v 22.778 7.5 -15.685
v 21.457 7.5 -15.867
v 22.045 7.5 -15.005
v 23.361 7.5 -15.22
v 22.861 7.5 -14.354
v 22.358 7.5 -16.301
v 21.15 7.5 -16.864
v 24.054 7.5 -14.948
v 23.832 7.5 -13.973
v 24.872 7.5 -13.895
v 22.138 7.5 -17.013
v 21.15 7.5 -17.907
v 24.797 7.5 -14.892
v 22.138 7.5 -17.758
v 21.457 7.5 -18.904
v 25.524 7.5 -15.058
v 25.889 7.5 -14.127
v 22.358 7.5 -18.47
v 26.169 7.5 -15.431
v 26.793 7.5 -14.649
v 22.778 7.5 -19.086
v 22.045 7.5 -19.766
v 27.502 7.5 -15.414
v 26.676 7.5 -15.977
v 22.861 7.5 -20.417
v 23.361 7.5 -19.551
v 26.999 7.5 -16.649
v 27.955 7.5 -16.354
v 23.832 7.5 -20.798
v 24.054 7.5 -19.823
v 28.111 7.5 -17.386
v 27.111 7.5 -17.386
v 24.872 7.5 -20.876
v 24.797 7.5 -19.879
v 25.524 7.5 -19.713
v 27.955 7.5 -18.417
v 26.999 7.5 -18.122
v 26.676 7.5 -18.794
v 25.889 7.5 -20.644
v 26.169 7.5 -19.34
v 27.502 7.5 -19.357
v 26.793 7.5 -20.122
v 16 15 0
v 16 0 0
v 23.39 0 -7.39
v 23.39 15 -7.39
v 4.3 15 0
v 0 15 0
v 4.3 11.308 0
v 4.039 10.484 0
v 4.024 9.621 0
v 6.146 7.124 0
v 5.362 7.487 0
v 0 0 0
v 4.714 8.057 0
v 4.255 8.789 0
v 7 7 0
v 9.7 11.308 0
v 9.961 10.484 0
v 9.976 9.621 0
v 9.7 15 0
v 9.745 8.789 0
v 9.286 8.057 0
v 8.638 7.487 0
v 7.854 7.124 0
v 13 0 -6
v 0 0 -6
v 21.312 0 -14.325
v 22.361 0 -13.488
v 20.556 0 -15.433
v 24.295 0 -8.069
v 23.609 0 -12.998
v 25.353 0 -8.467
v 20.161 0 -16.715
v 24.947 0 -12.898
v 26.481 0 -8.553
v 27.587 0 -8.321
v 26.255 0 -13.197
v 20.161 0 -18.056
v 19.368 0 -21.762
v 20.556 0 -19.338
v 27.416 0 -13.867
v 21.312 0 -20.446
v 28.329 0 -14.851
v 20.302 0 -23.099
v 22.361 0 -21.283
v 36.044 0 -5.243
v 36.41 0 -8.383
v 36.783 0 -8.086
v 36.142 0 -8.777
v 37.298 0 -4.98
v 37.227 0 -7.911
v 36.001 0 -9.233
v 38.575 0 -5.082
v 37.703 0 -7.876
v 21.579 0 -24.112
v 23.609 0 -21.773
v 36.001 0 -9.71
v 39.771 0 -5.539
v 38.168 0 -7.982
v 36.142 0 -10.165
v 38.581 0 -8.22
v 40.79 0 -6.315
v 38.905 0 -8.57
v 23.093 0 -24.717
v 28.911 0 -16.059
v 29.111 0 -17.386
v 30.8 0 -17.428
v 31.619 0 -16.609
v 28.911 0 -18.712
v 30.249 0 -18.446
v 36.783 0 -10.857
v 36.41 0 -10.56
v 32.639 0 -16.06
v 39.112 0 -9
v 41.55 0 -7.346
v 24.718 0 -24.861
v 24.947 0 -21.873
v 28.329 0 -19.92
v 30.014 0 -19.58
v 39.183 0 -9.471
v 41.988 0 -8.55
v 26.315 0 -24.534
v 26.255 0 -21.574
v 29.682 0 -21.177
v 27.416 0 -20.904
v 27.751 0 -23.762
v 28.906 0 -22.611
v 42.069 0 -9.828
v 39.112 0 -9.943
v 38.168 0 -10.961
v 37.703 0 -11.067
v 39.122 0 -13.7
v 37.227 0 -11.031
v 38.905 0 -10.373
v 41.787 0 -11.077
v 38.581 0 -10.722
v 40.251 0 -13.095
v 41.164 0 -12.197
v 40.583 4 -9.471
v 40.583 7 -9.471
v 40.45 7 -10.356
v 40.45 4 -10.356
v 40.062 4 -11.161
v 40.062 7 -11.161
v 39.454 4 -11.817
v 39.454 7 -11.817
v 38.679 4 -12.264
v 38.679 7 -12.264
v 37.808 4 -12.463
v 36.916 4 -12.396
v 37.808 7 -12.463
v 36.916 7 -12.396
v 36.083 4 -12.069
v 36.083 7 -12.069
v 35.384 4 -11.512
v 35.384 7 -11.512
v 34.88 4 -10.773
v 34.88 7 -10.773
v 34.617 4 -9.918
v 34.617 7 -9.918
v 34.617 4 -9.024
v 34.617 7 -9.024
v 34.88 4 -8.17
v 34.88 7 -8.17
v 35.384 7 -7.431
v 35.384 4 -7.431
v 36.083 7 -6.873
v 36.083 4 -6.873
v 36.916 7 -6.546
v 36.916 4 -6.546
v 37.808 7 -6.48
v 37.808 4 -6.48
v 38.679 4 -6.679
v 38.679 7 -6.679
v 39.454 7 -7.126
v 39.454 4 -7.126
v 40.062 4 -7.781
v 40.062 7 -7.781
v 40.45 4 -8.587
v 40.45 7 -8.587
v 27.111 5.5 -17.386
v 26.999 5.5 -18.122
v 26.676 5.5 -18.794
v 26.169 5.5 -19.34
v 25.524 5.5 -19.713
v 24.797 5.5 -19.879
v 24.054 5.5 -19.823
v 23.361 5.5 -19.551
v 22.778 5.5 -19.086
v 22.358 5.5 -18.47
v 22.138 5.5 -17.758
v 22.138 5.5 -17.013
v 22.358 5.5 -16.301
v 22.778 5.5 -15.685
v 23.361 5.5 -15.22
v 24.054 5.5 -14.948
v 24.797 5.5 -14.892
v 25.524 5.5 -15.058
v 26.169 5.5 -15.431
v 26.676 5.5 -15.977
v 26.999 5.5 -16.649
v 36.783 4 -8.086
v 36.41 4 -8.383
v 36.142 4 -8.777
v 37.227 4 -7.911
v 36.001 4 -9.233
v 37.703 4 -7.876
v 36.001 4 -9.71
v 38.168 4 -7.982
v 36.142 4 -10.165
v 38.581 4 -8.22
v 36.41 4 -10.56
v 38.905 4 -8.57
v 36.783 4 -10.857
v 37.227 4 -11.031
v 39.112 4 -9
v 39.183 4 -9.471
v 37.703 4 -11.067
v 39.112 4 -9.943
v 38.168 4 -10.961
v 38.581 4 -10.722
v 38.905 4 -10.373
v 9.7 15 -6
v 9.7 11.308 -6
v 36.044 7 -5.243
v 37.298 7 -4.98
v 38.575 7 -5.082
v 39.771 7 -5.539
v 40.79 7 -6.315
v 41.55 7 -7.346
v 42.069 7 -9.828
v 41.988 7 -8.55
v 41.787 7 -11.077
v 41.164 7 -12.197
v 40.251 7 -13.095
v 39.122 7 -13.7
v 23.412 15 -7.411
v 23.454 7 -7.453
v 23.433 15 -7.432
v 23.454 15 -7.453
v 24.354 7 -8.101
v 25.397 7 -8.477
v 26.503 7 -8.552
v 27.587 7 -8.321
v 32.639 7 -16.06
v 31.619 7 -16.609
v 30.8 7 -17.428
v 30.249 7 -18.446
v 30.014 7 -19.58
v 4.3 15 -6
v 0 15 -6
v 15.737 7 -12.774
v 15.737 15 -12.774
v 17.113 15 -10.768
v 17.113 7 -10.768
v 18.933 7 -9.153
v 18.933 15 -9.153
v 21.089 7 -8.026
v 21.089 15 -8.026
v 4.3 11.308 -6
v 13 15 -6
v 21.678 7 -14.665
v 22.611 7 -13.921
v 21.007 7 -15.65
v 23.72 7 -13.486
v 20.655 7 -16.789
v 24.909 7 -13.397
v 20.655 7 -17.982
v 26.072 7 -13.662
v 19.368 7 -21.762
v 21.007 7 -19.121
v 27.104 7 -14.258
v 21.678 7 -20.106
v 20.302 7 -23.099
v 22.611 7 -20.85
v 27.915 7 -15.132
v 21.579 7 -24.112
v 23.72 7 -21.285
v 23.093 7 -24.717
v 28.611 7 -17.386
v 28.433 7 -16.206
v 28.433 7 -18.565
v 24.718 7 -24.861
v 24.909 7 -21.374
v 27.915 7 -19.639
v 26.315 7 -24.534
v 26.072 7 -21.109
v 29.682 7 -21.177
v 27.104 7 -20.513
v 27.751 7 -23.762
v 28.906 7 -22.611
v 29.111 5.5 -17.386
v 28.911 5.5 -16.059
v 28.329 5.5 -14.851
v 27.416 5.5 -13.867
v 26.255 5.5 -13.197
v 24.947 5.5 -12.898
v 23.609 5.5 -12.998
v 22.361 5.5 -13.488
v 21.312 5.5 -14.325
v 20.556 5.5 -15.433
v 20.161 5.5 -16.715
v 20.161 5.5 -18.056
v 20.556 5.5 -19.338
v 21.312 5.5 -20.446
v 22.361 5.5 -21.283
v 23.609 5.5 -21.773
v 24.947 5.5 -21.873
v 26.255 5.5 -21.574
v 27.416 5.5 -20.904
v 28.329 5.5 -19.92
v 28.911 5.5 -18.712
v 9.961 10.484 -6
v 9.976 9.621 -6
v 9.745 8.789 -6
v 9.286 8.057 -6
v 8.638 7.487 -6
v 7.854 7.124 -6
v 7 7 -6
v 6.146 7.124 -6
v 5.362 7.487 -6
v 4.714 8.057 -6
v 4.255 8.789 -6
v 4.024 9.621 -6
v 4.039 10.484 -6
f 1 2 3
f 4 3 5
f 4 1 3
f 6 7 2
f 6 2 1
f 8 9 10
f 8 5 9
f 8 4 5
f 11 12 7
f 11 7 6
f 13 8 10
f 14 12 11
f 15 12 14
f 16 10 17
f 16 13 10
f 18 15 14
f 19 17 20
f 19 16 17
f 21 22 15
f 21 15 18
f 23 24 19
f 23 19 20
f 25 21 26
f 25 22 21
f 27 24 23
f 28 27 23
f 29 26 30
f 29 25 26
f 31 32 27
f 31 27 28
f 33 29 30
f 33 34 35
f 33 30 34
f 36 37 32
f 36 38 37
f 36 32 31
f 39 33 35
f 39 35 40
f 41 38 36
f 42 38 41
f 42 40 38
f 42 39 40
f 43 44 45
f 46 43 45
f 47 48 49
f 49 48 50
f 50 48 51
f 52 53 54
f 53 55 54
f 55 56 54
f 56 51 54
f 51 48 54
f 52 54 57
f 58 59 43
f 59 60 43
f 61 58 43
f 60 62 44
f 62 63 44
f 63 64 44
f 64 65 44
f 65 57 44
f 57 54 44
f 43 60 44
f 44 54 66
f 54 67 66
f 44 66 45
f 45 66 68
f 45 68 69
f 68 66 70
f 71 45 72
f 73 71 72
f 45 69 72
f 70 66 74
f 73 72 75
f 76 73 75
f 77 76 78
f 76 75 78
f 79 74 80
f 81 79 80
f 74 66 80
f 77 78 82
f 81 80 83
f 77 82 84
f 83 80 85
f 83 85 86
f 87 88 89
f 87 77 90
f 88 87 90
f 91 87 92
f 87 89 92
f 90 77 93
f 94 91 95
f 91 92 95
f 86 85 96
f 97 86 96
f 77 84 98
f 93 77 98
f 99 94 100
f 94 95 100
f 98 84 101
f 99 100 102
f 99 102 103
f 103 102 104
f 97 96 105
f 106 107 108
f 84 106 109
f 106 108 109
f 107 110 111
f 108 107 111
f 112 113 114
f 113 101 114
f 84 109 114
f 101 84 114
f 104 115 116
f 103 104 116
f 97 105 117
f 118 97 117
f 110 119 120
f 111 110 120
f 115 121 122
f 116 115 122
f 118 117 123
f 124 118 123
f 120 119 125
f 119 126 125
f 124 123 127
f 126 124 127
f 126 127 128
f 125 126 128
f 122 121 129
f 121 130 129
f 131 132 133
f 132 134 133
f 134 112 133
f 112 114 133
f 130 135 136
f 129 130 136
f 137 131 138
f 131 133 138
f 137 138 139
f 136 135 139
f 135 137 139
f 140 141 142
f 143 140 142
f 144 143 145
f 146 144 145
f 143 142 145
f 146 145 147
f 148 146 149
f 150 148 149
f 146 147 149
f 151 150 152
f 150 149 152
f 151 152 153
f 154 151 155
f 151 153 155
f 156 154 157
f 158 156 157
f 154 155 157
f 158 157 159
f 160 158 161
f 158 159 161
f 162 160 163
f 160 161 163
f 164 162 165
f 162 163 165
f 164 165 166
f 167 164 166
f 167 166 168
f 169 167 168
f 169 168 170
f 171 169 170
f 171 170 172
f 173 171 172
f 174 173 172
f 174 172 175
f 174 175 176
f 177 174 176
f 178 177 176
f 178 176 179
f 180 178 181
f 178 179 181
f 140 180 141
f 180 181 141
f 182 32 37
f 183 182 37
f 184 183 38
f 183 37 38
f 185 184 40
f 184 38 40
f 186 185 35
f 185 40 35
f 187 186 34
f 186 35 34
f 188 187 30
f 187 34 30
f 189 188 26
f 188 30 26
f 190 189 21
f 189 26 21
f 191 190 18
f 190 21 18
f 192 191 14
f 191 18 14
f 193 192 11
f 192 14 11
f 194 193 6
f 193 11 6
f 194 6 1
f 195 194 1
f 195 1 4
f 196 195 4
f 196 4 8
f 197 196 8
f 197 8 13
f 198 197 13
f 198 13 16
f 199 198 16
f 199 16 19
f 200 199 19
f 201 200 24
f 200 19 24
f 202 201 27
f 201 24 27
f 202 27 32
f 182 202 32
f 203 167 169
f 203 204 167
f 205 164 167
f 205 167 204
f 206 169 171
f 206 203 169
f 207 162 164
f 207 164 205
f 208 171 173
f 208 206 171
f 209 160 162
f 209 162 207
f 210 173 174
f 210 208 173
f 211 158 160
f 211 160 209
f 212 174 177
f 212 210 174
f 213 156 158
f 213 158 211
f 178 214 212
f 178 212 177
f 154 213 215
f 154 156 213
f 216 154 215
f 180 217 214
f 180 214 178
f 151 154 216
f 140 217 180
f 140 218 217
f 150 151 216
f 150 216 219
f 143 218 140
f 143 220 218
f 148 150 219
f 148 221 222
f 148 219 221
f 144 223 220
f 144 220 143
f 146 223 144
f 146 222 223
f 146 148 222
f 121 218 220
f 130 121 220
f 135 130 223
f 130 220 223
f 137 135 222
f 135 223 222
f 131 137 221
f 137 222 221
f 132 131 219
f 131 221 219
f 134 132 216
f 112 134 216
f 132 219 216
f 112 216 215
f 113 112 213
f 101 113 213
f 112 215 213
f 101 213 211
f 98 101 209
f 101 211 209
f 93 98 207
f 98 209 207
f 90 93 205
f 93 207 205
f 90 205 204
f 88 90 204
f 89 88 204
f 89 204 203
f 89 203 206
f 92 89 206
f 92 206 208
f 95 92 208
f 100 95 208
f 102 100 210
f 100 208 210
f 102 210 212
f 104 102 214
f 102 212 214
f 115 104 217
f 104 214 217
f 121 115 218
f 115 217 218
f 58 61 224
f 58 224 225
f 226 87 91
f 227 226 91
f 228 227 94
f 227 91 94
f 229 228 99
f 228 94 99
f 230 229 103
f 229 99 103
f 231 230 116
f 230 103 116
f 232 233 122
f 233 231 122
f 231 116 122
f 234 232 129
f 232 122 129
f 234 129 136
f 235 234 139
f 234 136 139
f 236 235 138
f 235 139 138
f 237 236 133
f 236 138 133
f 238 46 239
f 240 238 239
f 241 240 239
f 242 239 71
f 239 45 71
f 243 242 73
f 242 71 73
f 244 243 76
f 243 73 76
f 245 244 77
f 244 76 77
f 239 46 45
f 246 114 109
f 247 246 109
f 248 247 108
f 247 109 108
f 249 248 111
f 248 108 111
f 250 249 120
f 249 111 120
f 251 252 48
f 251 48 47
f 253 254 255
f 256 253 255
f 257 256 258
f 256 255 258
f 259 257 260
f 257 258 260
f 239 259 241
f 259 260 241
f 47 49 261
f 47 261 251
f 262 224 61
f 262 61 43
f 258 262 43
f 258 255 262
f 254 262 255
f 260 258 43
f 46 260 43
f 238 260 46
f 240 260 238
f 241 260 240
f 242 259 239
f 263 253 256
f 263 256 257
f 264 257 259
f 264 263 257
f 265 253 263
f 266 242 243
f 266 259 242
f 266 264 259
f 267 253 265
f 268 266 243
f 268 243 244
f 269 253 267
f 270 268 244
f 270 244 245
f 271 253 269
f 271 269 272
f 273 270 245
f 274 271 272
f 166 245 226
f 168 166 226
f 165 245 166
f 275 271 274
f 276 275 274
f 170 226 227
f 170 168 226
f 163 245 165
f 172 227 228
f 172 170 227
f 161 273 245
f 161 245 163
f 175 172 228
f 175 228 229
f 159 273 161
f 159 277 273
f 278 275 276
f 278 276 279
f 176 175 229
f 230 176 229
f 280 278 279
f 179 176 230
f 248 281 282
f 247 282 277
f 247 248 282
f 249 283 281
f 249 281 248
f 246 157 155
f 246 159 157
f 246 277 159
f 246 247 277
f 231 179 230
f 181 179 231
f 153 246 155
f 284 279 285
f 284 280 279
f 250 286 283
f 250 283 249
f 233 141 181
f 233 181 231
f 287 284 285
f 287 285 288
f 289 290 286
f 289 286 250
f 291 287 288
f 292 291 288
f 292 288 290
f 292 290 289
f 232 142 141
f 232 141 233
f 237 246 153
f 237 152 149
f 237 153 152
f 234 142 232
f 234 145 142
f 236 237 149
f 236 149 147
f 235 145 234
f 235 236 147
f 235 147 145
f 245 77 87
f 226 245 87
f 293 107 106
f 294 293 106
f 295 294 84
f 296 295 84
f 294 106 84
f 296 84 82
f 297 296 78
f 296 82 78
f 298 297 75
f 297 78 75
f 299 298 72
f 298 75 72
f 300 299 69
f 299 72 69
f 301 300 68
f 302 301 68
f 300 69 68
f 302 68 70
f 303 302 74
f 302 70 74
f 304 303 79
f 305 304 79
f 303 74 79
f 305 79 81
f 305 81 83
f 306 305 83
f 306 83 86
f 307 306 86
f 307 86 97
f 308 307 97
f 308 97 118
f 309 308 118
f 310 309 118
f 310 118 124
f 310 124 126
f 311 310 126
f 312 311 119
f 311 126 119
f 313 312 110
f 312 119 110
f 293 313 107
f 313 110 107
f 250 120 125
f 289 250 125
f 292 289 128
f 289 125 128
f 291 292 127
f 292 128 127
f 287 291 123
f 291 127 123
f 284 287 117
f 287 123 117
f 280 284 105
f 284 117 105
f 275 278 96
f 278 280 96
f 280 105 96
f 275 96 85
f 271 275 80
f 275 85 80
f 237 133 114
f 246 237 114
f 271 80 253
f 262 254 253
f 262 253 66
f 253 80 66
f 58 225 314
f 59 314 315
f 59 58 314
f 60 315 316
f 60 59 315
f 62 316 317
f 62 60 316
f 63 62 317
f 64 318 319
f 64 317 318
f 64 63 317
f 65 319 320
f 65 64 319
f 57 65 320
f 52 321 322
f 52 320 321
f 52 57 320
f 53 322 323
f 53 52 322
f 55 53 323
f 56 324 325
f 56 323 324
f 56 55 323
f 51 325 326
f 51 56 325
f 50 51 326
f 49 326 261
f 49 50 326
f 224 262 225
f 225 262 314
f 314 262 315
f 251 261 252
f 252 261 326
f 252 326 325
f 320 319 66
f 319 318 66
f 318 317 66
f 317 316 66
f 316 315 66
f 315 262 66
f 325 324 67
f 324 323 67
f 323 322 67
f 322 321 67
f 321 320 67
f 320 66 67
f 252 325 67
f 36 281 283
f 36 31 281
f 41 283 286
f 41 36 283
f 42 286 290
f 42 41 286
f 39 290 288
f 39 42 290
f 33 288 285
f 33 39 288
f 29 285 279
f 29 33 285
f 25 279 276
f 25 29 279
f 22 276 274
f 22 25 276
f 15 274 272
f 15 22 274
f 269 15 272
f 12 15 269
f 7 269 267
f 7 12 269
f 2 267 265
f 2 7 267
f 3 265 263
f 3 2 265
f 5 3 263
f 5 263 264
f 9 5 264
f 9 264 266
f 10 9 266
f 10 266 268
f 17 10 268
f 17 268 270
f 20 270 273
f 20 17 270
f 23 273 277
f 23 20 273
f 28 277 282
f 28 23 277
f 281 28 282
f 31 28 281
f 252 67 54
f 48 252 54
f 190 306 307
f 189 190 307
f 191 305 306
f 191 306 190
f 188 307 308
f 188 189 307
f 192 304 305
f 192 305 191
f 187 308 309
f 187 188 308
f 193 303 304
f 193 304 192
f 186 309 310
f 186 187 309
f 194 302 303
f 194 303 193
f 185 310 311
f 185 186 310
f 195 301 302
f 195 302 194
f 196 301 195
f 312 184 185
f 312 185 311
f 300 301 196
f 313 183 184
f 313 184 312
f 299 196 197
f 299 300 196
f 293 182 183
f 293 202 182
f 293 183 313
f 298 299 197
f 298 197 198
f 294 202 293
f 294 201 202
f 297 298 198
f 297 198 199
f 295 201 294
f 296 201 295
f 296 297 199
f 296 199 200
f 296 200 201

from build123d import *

# Parameters (mm, degrees)
BOSS_EXTRUDE2_DEPTH = 15
CUT_EXTRUDE2_DEPTH  = 8
SKETCH5_R           = 4
BOSS_EXTRUDE3_DEPTH = 0.5
BOSS_EXTRUDE3_TAPER = 45
SKETCH6_R           = 2.5
CUT_EXTRUDE3_DEPTH  = 2
SKETCH7_R           = 4.5
CUT_EXTRUDE4_DEPTH  = 5.5
CUT_EXTRUDE5_DEPTH  = 15
SKETCH9_R           = 3
CUT_EXTRUDE6_DEPTH  = 3
SKETCH10_R          = 1.6
CUT_EXTRUDE7_DEPTH  = 4


with BuildPart() as part:
    # Sketch1 → Boss-Extrude2 (new body)
    with BuildSketch(Plane(origin=(0, 0, 0), x_dir=(1, 0, 0), z_dir=(0, 1, 0))):
        with BuildLine():
            Line((0, 0), (16, 0))
            Line((16, 0), (23.390481349, 7.390481349))
            ThreePointArc((23.390481349, 7.390481349), (25.353150018, 8.467238253), (27.586989047, 8.320824708))
            Line((27.586989047, 8.320824708), (36.044222635, 5.242643418))
            ThreePointArc((36.044222635, 5.242643418), (41.811930073, 7.932169566), (39.122403924, 13.699877005))
            Line((39.122403924, 13.699877005), (32.638524841, 16.059815994))
            ThreePointArc((32.638524841, 16.059815994), (30.799841796, 17.427631209), (30.013713531, 19.580228745))
            ThreePointArc((30.013713531, 19.580228745), (25.528138256, 24.7554842), (19.368312088, 21.762125528))
            Line((19.368312088, 21.762125528), (13, 6))
            Line((13, 6), (0, 6))
            Line((0, 6), (0, 0))
        make_face()
    extrude(amount=BOSS_EXTRUDE2_DEPTH)

    # Sketch4 → Cut-Extrude2 (cut)
    with BuildSketch(Plane(origin=(0, 15, 0), x_dir=(1, 0, 0), z_dir=(0, 1, 0))):
        with BuildLine():
            Line((27.527056586, 7.82026535), (39.563282013, 1.837894564))
            Line((39.563282013, 1.837894564), (45.039561208, 12.855889478))
            Line((45.039561208, 12.855889478), (34.588386796, 18.050441613))
            ThreePointArc((34.588386796, 18.050441613), (16.380660644, 23.066124632), (27.527056586, 7.82026535))
        make_face()
    extrude(amount=-CUT_EXTRUDE2_DEPTH, mode=Mode.SUBTRACT)

    # Sketch5 → Boss-Extrude3 (add)
    with BuildSketch(Plane(origin=(0, 7, 0), x_dir=(1, 0, 0), z_dir=(0, 1, 0))):
        with Locations((24.610518338, 17.385504743)):
            Circle(SKETCH5_R)
    extrude(amount=BOSS_EXTRUDE3_DEPTH, taper=BOSS_EXTRUDE3_TAPER)

    # Sketch6 → Cut-Extrude3 (cut)
    with BuildSketch(Plane(origin=(0, 7.5, 0), x_dir=(1, 0, 0), z_dir=(0, 1, 0))):
        with Locations((24.610518338, 17.385504743)):
            Circle(SKETCH6_R)
    extrude(amount=-CUT_EXTRUDE3_DEPTH, mode=Mode.SUBTRACT)

    # Sketch7 → Cut-Extrude4 (cut)
    with BuildSketch(Plane.XZ):
        with Locations((24.610518338, -17.385504743)):
            Circle(SKETCH7_R)
    extrude(amount=-CUT_EXTRUDE4_DEPTH, mode=Mode.SUBTRACT)

    # Sketch8 → Cut-Extrude5 (cut)
    with BuildSketch(Plane.XY):
        with BuildLine():
            Line((4.3, 11.307669683), (4.3, 15))
            Line((4.3, 15), (9.7, 15))
            Line((9.7, 15), (9.7, 11.307669683))
            ThreePointArc((9.7, 11.307669683), (7, 7), (4.3, 11.307669683))
        make_face()
    extrude(amount=-CUT_EXTRUDE5_DEPTH, mode=Mode.SUBTRACT)

    # Sketch9 → Cut-Extrude6 (cut)
    with BuildSketch(Plane(origin=(0, 7, 0), x_dir=(1, 0, 0), z_dir=(0, 1, 0))):
        with Locations((37.583313279, 9.471260211)):
            Circle(SKETCH9_R)
    extrude(amount=-CUT_EXTRUDE6_DEPTH, mode=Mode.SUBTRACT)

    # Sketch10 → Cut-Extrude7 (cut)
    with BuildSketch(Plane(origin=(0, 4, 0), x_dir=(1, 0, 0), z_dir=(0, 1, 0))):
        with Locations((37.583313279, 9.471260211)):
            Circle(SKETCH10_R)
    extrude(amount=-CUT_EXTRUDE7_DEPTH, mode=Mode.SUBTRACT)


solid = part.part
